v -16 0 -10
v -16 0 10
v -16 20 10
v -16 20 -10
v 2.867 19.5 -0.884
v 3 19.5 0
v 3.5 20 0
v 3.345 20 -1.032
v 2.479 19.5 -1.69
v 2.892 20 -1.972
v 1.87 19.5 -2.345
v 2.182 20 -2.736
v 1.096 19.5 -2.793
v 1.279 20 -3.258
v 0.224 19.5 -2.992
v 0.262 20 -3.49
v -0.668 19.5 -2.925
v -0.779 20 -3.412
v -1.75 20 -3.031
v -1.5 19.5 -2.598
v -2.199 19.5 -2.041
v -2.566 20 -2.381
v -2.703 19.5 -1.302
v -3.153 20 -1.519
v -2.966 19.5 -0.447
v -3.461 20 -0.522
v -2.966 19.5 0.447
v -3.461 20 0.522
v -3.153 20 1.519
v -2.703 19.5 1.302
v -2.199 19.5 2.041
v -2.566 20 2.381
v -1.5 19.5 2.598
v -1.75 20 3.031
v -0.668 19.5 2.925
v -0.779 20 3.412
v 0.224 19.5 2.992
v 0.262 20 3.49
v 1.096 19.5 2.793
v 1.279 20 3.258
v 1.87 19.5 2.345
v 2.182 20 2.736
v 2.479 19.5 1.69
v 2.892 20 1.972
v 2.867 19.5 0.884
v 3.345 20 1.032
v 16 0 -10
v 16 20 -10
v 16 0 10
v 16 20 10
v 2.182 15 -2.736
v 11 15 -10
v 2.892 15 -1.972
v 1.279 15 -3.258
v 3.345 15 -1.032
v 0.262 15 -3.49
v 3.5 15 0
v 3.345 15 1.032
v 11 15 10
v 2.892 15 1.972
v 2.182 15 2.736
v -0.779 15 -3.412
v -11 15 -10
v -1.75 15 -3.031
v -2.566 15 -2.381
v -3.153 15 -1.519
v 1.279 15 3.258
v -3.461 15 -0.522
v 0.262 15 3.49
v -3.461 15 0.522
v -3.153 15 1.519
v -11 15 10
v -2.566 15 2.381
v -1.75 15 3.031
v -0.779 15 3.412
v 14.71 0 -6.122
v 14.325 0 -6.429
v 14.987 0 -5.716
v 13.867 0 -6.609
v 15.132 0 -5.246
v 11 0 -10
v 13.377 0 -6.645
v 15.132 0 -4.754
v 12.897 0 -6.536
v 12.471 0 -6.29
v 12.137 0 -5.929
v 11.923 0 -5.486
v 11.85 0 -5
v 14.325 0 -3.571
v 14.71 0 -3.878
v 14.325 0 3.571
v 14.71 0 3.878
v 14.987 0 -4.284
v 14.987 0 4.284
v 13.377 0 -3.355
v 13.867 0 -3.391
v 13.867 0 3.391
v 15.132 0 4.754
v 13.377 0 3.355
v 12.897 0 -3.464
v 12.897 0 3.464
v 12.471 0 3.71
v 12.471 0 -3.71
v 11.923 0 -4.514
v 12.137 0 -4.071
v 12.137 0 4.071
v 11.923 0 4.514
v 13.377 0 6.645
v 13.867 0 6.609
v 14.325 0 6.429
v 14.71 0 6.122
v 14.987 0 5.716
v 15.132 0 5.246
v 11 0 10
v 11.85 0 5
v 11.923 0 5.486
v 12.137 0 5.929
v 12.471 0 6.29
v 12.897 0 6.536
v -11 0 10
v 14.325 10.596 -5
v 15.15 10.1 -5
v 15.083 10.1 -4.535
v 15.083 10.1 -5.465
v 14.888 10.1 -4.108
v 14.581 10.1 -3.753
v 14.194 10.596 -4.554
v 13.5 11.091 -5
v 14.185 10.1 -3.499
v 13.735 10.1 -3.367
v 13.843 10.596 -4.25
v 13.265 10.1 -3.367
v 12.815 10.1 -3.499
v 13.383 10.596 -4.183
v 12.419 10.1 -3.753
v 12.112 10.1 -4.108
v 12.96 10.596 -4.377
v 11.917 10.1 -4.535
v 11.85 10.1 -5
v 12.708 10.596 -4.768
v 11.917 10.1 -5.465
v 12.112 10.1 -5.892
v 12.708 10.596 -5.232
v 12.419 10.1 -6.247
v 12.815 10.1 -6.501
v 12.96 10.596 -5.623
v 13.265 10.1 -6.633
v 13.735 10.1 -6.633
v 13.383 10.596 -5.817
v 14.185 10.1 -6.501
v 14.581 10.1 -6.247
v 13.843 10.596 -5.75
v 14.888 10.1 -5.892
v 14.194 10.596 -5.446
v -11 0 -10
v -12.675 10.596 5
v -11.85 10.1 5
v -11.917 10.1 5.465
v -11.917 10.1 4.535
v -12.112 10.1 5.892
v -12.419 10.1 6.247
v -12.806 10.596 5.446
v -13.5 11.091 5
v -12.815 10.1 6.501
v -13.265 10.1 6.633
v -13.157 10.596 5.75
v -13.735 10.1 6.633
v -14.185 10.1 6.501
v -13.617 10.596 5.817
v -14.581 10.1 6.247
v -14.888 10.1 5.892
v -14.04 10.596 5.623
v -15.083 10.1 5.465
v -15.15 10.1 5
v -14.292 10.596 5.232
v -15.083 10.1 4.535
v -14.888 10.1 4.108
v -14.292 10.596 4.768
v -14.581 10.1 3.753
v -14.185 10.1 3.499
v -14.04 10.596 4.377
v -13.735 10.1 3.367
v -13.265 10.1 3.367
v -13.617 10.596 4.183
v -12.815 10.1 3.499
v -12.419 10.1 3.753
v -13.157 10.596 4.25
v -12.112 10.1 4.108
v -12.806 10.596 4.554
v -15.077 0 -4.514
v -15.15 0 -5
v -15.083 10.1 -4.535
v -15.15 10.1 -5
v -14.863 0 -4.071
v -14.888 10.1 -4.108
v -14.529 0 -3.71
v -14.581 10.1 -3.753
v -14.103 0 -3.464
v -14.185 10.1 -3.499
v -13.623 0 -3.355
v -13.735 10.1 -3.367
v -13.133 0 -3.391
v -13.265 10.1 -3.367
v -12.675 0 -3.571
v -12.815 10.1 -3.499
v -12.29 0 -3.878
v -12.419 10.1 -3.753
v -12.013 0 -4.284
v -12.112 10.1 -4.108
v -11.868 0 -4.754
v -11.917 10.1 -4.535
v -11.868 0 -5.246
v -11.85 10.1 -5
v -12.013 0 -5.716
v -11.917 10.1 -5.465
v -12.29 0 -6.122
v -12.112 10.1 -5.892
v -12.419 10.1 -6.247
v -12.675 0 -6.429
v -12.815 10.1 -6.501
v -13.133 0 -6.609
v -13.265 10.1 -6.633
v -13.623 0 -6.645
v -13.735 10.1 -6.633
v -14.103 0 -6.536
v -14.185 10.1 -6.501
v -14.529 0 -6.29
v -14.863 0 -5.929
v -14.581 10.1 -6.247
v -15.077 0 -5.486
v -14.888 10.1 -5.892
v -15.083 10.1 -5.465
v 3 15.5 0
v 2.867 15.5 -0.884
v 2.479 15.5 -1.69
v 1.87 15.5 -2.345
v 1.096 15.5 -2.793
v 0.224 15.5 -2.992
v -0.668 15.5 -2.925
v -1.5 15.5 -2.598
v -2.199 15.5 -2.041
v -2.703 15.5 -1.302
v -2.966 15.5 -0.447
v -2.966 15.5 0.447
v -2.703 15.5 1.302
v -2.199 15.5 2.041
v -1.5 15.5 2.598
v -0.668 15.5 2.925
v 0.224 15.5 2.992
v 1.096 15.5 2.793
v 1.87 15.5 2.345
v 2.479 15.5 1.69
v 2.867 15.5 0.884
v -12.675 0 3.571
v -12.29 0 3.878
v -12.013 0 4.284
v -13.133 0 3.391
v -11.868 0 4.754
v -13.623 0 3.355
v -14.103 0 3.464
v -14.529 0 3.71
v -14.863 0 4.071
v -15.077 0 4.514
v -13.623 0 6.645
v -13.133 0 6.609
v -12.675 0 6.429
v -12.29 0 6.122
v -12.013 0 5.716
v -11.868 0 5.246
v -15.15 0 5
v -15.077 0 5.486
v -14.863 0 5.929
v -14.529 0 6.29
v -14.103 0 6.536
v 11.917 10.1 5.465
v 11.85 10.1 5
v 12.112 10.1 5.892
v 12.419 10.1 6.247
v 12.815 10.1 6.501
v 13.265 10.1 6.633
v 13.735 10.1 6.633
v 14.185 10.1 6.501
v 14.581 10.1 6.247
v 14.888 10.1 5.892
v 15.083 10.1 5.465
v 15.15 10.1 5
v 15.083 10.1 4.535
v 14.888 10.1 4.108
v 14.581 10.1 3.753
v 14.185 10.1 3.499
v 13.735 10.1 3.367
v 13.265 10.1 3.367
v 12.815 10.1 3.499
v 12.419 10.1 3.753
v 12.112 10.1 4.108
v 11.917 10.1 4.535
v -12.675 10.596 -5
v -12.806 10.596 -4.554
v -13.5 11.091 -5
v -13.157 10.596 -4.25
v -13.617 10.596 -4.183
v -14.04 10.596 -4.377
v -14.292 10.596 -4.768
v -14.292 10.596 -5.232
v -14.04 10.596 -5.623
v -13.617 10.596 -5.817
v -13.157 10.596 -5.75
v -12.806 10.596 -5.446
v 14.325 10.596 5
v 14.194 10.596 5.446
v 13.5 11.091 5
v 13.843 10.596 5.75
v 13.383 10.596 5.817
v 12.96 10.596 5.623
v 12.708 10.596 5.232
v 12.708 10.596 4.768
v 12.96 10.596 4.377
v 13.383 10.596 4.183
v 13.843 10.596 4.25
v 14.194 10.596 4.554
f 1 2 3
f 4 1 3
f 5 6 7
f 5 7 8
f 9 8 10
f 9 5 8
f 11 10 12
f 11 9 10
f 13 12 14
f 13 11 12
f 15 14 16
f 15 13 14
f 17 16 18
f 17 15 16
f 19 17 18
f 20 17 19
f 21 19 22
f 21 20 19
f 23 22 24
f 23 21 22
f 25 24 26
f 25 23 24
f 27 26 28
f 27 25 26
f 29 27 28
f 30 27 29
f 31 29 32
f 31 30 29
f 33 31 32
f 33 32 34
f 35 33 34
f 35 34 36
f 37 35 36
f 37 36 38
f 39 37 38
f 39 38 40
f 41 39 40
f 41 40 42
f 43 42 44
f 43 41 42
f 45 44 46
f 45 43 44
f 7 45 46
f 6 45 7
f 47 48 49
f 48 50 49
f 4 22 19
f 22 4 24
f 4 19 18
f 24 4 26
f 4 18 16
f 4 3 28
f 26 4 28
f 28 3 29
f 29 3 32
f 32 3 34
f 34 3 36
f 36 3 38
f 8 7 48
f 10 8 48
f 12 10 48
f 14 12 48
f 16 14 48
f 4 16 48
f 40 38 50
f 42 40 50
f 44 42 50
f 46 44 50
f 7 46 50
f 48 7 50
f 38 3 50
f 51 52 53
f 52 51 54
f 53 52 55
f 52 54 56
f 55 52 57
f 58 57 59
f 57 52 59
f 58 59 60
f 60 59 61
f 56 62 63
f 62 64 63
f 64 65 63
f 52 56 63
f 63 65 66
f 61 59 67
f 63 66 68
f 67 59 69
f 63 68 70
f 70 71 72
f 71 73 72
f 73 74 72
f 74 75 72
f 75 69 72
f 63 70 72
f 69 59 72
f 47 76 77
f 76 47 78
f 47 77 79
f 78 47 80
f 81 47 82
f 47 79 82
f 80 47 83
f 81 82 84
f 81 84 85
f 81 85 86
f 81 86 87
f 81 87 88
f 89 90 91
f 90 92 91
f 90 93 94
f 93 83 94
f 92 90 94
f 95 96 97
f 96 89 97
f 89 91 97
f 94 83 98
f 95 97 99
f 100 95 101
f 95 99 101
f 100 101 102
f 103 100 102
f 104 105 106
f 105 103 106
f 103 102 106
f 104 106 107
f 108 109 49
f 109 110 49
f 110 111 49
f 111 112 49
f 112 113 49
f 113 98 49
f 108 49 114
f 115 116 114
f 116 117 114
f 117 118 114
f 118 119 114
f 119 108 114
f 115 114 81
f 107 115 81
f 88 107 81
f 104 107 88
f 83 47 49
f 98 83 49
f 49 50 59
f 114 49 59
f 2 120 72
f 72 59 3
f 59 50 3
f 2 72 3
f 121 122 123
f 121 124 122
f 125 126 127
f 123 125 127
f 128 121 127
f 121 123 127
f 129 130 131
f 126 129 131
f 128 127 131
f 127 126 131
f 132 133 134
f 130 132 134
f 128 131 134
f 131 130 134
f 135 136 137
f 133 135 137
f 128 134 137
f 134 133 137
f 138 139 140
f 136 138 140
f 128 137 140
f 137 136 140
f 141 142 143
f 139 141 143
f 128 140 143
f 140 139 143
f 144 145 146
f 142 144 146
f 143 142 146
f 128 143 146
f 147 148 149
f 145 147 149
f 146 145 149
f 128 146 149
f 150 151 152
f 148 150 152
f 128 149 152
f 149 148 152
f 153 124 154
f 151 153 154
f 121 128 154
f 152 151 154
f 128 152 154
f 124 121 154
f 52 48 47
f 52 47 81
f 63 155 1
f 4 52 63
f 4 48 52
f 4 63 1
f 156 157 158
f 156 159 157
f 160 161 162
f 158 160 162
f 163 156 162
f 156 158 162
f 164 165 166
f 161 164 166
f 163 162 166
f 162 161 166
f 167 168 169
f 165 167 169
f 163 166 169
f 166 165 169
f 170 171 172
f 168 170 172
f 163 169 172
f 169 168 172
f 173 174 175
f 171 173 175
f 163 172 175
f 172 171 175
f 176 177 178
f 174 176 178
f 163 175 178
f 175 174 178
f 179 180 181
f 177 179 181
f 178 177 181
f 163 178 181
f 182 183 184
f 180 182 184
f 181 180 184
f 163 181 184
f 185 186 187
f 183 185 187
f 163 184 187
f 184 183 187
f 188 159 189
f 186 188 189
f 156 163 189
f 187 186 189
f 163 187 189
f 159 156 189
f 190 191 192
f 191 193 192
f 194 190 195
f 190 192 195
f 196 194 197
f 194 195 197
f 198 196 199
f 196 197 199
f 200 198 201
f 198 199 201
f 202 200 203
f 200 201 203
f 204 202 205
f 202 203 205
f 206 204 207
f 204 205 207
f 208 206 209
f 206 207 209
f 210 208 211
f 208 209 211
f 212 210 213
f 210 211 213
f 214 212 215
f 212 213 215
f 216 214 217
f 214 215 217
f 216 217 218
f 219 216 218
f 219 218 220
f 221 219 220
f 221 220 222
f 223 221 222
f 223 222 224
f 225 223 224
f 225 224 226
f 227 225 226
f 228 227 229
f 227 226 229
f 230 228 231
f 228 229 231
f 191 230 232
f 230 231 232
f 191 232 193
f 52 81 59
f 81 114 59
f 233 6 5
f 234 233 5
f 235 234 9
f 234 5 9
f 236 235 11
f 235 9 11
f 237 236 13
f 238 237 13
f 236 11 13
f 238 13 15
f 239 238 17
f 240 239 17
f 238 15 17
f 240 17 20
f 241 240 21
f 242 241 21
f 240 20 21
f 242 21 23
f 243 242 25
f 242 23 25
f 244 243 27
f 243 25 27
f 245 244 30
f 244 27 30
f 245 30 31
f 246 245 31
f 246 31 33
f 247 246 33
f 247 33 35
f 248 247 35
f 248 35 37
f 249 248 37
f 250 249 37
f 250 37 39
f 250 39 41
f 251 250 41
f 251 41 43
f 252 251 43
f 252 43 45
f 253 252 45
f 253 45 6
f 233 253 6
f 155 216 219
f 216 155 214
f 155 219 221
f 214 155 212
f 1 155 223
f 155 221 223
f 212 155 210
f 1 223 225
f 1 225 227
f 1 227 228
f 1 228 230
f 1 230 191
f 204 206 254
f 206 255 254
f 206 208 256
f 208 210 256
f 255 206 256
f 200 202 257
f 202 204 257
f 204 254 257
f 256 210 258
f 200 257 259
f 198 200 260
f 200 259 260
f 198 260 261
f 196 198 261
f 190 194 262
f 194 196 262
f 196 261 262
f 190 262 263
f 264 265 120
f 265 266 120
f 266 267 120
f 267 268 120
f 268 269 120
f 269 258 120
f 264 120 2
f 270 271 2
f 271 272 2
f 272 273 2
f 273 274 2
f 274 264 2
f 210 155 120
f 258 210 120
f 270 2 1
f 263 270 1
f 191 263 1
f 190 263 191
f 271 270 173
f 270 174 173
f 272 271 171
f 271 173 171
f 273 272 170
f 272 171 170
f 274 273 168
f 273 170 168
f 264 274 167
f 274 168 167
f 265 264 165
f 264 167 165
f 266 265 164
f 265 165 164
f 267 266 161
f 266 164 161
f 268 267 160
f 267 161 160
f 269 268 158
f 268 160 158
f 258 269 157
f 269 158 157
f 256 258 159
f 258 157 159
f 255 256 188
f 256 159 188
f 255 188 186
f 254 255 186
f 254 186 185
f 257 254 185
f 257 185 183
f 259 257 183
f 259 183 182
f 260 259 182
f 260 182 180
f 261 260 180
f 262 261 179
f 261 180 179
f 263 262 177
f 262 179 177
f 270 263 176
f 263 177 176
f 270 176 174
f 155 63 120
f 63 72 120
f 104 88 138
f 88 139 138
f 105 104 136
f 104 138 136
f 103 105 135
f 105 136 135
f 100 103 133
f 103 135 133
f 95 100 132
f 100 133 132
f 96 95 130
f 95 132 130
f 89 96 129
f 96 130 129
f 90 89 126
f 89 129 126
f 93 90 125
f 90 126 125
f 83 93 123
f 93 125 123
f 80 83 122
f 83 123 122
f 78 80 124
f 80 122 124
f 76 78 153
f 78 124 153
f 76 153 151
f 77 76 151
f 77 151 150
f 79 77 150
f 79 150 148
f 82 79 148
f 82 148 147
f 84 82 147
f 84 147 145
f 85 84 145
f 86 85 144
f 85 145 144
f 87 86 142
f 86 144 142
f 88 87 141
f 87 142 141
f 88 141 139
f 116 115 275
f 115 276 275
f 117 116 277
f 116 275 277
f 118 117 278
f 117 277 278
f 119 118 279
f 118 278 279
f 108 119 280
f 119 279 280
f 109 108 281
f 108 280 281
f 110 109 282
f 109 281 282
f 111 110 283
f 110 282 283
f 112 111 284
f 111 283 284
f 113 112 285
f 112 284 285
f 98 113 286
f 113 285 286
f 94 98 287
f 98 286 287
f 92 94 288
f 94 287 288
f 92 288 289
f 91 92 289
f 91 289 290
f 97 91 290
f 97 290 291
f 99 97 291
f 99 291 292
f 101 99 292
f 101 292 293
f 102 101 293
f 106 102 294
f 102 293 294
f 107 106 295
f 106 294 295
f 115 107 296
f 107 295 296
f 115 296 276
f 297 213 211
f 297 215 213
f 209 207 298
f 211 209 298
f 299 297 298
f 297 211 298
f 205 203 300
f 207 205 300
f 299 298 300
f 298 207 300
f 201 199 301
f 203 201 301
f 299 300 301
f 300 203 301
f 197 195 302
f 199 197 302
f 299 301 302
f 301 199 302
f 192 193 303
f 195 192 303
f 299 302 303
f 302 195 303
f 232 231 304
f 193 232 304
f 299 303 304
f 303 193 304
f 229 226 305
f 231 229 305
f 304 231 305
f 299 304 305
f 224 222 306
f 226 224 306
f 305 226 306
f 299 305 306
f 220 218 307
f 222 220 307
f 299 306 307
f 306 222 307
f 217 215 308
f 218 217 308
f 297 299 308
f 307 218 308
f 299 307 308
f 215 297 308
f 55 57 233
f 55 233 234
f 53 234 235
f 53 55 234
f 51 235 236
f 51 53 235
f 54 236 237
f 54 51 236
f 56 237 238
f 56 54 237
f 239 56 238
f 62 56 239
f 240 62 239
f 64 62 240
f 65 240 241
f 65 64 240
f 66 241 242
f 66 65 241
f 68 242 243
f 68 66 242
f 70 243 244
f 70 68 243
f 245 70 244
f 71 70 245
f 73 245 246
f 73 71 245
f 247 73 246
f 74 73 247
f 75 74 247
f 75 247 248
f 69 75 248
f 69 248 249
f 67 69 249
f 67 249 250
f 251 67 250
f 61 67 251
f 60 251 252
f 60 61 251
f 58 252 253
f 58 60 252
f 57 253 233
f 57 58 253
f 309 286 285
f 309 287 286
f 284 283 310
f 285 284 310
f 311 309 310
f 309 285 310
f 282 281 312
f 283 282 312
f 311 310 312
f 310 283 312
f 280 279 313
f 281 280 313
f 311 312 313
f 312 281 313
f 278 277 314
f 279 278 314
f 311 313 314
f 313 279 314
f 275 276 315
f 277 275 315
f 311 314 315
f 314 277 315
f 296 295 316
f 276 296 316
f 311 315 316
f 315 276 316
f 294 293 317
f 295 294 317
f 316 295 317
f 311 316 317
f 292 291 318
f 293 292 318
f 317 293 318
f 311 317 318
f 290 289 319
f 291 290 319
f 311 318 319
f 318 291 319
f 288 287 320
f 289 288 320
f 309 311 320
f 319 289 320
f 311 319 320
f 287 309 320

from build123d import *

# Parameters (mm, degrees)
BOSS_EXTRU_1_DEPTH      = 10
ESQUISSE2_R             = 3
ENL_V_MAT_EXTRU_1_DEPTH = 21
CHANFREIN1_SIZE         = 0.5
TROU_TARAUD_M41_D       = 3.3
TROU_TARAUD_M41_DEPTH   = 10.1
TROU_TARAUD_M41_TIP     = 0.991420021


with BuildPart() as part:
    # Esquisse1 → Boss.-Extru.1 (new body, symmetric)
    with BuildSketch(Plane.XY):
        Polygon((-16, 20), (16, 20), (16, 0), (11, 0), (11, 15), (-11, 15), (-11, 0), (-16, 0), align=None)
    extrude(amount=BOSS_EXTRU_1_DEPTH, both=True)

    # Esquisse2 → Enlèv. mat.-Extru.1 (cut, through all)
    with BuildSketch(Plane(origin=(0, 20, 0), x_dir=(1, 0, 0), z_dir=(0, 1, 0))):
        Circle(ESQUISSE2_R)
    extrude(amount=-ENL_V_MAT_EXTRU_1_DEPTH, mode=Mode.SUBTRACT)

    # Chanfrein1
    chanfrein1_edges = [part.edges().sort_by_distance(p)[0] for p in [
        (-3, 15, 0),
        (-3, 20, 0),
    ]]
    chamfer(chanfrein1_edges, length=CHANFREIN1_SIZE)

    # Trou taraudé M41
    with Locations(Plane.XZ):
        with Locations((13.5, 5), (-13.5, -5), (-13.5, 5), (13.5, -5)):
            Hole(TROU_TARAUD_M41_D / 2, depth=TROU_TARAUD_M41_DEPTH)
            with Locations((0, 0, -(TROU_TARAUD_M41_DEPTH + TROU_TARAUD_M41_TIP / 2))):  # 118° drill point
                Cone(0, TROU_TARAUD_M41_D / 2, TROU_TARAUD_M41_TIP, mode=Mode.SUBTRACT)


solid = part.part
